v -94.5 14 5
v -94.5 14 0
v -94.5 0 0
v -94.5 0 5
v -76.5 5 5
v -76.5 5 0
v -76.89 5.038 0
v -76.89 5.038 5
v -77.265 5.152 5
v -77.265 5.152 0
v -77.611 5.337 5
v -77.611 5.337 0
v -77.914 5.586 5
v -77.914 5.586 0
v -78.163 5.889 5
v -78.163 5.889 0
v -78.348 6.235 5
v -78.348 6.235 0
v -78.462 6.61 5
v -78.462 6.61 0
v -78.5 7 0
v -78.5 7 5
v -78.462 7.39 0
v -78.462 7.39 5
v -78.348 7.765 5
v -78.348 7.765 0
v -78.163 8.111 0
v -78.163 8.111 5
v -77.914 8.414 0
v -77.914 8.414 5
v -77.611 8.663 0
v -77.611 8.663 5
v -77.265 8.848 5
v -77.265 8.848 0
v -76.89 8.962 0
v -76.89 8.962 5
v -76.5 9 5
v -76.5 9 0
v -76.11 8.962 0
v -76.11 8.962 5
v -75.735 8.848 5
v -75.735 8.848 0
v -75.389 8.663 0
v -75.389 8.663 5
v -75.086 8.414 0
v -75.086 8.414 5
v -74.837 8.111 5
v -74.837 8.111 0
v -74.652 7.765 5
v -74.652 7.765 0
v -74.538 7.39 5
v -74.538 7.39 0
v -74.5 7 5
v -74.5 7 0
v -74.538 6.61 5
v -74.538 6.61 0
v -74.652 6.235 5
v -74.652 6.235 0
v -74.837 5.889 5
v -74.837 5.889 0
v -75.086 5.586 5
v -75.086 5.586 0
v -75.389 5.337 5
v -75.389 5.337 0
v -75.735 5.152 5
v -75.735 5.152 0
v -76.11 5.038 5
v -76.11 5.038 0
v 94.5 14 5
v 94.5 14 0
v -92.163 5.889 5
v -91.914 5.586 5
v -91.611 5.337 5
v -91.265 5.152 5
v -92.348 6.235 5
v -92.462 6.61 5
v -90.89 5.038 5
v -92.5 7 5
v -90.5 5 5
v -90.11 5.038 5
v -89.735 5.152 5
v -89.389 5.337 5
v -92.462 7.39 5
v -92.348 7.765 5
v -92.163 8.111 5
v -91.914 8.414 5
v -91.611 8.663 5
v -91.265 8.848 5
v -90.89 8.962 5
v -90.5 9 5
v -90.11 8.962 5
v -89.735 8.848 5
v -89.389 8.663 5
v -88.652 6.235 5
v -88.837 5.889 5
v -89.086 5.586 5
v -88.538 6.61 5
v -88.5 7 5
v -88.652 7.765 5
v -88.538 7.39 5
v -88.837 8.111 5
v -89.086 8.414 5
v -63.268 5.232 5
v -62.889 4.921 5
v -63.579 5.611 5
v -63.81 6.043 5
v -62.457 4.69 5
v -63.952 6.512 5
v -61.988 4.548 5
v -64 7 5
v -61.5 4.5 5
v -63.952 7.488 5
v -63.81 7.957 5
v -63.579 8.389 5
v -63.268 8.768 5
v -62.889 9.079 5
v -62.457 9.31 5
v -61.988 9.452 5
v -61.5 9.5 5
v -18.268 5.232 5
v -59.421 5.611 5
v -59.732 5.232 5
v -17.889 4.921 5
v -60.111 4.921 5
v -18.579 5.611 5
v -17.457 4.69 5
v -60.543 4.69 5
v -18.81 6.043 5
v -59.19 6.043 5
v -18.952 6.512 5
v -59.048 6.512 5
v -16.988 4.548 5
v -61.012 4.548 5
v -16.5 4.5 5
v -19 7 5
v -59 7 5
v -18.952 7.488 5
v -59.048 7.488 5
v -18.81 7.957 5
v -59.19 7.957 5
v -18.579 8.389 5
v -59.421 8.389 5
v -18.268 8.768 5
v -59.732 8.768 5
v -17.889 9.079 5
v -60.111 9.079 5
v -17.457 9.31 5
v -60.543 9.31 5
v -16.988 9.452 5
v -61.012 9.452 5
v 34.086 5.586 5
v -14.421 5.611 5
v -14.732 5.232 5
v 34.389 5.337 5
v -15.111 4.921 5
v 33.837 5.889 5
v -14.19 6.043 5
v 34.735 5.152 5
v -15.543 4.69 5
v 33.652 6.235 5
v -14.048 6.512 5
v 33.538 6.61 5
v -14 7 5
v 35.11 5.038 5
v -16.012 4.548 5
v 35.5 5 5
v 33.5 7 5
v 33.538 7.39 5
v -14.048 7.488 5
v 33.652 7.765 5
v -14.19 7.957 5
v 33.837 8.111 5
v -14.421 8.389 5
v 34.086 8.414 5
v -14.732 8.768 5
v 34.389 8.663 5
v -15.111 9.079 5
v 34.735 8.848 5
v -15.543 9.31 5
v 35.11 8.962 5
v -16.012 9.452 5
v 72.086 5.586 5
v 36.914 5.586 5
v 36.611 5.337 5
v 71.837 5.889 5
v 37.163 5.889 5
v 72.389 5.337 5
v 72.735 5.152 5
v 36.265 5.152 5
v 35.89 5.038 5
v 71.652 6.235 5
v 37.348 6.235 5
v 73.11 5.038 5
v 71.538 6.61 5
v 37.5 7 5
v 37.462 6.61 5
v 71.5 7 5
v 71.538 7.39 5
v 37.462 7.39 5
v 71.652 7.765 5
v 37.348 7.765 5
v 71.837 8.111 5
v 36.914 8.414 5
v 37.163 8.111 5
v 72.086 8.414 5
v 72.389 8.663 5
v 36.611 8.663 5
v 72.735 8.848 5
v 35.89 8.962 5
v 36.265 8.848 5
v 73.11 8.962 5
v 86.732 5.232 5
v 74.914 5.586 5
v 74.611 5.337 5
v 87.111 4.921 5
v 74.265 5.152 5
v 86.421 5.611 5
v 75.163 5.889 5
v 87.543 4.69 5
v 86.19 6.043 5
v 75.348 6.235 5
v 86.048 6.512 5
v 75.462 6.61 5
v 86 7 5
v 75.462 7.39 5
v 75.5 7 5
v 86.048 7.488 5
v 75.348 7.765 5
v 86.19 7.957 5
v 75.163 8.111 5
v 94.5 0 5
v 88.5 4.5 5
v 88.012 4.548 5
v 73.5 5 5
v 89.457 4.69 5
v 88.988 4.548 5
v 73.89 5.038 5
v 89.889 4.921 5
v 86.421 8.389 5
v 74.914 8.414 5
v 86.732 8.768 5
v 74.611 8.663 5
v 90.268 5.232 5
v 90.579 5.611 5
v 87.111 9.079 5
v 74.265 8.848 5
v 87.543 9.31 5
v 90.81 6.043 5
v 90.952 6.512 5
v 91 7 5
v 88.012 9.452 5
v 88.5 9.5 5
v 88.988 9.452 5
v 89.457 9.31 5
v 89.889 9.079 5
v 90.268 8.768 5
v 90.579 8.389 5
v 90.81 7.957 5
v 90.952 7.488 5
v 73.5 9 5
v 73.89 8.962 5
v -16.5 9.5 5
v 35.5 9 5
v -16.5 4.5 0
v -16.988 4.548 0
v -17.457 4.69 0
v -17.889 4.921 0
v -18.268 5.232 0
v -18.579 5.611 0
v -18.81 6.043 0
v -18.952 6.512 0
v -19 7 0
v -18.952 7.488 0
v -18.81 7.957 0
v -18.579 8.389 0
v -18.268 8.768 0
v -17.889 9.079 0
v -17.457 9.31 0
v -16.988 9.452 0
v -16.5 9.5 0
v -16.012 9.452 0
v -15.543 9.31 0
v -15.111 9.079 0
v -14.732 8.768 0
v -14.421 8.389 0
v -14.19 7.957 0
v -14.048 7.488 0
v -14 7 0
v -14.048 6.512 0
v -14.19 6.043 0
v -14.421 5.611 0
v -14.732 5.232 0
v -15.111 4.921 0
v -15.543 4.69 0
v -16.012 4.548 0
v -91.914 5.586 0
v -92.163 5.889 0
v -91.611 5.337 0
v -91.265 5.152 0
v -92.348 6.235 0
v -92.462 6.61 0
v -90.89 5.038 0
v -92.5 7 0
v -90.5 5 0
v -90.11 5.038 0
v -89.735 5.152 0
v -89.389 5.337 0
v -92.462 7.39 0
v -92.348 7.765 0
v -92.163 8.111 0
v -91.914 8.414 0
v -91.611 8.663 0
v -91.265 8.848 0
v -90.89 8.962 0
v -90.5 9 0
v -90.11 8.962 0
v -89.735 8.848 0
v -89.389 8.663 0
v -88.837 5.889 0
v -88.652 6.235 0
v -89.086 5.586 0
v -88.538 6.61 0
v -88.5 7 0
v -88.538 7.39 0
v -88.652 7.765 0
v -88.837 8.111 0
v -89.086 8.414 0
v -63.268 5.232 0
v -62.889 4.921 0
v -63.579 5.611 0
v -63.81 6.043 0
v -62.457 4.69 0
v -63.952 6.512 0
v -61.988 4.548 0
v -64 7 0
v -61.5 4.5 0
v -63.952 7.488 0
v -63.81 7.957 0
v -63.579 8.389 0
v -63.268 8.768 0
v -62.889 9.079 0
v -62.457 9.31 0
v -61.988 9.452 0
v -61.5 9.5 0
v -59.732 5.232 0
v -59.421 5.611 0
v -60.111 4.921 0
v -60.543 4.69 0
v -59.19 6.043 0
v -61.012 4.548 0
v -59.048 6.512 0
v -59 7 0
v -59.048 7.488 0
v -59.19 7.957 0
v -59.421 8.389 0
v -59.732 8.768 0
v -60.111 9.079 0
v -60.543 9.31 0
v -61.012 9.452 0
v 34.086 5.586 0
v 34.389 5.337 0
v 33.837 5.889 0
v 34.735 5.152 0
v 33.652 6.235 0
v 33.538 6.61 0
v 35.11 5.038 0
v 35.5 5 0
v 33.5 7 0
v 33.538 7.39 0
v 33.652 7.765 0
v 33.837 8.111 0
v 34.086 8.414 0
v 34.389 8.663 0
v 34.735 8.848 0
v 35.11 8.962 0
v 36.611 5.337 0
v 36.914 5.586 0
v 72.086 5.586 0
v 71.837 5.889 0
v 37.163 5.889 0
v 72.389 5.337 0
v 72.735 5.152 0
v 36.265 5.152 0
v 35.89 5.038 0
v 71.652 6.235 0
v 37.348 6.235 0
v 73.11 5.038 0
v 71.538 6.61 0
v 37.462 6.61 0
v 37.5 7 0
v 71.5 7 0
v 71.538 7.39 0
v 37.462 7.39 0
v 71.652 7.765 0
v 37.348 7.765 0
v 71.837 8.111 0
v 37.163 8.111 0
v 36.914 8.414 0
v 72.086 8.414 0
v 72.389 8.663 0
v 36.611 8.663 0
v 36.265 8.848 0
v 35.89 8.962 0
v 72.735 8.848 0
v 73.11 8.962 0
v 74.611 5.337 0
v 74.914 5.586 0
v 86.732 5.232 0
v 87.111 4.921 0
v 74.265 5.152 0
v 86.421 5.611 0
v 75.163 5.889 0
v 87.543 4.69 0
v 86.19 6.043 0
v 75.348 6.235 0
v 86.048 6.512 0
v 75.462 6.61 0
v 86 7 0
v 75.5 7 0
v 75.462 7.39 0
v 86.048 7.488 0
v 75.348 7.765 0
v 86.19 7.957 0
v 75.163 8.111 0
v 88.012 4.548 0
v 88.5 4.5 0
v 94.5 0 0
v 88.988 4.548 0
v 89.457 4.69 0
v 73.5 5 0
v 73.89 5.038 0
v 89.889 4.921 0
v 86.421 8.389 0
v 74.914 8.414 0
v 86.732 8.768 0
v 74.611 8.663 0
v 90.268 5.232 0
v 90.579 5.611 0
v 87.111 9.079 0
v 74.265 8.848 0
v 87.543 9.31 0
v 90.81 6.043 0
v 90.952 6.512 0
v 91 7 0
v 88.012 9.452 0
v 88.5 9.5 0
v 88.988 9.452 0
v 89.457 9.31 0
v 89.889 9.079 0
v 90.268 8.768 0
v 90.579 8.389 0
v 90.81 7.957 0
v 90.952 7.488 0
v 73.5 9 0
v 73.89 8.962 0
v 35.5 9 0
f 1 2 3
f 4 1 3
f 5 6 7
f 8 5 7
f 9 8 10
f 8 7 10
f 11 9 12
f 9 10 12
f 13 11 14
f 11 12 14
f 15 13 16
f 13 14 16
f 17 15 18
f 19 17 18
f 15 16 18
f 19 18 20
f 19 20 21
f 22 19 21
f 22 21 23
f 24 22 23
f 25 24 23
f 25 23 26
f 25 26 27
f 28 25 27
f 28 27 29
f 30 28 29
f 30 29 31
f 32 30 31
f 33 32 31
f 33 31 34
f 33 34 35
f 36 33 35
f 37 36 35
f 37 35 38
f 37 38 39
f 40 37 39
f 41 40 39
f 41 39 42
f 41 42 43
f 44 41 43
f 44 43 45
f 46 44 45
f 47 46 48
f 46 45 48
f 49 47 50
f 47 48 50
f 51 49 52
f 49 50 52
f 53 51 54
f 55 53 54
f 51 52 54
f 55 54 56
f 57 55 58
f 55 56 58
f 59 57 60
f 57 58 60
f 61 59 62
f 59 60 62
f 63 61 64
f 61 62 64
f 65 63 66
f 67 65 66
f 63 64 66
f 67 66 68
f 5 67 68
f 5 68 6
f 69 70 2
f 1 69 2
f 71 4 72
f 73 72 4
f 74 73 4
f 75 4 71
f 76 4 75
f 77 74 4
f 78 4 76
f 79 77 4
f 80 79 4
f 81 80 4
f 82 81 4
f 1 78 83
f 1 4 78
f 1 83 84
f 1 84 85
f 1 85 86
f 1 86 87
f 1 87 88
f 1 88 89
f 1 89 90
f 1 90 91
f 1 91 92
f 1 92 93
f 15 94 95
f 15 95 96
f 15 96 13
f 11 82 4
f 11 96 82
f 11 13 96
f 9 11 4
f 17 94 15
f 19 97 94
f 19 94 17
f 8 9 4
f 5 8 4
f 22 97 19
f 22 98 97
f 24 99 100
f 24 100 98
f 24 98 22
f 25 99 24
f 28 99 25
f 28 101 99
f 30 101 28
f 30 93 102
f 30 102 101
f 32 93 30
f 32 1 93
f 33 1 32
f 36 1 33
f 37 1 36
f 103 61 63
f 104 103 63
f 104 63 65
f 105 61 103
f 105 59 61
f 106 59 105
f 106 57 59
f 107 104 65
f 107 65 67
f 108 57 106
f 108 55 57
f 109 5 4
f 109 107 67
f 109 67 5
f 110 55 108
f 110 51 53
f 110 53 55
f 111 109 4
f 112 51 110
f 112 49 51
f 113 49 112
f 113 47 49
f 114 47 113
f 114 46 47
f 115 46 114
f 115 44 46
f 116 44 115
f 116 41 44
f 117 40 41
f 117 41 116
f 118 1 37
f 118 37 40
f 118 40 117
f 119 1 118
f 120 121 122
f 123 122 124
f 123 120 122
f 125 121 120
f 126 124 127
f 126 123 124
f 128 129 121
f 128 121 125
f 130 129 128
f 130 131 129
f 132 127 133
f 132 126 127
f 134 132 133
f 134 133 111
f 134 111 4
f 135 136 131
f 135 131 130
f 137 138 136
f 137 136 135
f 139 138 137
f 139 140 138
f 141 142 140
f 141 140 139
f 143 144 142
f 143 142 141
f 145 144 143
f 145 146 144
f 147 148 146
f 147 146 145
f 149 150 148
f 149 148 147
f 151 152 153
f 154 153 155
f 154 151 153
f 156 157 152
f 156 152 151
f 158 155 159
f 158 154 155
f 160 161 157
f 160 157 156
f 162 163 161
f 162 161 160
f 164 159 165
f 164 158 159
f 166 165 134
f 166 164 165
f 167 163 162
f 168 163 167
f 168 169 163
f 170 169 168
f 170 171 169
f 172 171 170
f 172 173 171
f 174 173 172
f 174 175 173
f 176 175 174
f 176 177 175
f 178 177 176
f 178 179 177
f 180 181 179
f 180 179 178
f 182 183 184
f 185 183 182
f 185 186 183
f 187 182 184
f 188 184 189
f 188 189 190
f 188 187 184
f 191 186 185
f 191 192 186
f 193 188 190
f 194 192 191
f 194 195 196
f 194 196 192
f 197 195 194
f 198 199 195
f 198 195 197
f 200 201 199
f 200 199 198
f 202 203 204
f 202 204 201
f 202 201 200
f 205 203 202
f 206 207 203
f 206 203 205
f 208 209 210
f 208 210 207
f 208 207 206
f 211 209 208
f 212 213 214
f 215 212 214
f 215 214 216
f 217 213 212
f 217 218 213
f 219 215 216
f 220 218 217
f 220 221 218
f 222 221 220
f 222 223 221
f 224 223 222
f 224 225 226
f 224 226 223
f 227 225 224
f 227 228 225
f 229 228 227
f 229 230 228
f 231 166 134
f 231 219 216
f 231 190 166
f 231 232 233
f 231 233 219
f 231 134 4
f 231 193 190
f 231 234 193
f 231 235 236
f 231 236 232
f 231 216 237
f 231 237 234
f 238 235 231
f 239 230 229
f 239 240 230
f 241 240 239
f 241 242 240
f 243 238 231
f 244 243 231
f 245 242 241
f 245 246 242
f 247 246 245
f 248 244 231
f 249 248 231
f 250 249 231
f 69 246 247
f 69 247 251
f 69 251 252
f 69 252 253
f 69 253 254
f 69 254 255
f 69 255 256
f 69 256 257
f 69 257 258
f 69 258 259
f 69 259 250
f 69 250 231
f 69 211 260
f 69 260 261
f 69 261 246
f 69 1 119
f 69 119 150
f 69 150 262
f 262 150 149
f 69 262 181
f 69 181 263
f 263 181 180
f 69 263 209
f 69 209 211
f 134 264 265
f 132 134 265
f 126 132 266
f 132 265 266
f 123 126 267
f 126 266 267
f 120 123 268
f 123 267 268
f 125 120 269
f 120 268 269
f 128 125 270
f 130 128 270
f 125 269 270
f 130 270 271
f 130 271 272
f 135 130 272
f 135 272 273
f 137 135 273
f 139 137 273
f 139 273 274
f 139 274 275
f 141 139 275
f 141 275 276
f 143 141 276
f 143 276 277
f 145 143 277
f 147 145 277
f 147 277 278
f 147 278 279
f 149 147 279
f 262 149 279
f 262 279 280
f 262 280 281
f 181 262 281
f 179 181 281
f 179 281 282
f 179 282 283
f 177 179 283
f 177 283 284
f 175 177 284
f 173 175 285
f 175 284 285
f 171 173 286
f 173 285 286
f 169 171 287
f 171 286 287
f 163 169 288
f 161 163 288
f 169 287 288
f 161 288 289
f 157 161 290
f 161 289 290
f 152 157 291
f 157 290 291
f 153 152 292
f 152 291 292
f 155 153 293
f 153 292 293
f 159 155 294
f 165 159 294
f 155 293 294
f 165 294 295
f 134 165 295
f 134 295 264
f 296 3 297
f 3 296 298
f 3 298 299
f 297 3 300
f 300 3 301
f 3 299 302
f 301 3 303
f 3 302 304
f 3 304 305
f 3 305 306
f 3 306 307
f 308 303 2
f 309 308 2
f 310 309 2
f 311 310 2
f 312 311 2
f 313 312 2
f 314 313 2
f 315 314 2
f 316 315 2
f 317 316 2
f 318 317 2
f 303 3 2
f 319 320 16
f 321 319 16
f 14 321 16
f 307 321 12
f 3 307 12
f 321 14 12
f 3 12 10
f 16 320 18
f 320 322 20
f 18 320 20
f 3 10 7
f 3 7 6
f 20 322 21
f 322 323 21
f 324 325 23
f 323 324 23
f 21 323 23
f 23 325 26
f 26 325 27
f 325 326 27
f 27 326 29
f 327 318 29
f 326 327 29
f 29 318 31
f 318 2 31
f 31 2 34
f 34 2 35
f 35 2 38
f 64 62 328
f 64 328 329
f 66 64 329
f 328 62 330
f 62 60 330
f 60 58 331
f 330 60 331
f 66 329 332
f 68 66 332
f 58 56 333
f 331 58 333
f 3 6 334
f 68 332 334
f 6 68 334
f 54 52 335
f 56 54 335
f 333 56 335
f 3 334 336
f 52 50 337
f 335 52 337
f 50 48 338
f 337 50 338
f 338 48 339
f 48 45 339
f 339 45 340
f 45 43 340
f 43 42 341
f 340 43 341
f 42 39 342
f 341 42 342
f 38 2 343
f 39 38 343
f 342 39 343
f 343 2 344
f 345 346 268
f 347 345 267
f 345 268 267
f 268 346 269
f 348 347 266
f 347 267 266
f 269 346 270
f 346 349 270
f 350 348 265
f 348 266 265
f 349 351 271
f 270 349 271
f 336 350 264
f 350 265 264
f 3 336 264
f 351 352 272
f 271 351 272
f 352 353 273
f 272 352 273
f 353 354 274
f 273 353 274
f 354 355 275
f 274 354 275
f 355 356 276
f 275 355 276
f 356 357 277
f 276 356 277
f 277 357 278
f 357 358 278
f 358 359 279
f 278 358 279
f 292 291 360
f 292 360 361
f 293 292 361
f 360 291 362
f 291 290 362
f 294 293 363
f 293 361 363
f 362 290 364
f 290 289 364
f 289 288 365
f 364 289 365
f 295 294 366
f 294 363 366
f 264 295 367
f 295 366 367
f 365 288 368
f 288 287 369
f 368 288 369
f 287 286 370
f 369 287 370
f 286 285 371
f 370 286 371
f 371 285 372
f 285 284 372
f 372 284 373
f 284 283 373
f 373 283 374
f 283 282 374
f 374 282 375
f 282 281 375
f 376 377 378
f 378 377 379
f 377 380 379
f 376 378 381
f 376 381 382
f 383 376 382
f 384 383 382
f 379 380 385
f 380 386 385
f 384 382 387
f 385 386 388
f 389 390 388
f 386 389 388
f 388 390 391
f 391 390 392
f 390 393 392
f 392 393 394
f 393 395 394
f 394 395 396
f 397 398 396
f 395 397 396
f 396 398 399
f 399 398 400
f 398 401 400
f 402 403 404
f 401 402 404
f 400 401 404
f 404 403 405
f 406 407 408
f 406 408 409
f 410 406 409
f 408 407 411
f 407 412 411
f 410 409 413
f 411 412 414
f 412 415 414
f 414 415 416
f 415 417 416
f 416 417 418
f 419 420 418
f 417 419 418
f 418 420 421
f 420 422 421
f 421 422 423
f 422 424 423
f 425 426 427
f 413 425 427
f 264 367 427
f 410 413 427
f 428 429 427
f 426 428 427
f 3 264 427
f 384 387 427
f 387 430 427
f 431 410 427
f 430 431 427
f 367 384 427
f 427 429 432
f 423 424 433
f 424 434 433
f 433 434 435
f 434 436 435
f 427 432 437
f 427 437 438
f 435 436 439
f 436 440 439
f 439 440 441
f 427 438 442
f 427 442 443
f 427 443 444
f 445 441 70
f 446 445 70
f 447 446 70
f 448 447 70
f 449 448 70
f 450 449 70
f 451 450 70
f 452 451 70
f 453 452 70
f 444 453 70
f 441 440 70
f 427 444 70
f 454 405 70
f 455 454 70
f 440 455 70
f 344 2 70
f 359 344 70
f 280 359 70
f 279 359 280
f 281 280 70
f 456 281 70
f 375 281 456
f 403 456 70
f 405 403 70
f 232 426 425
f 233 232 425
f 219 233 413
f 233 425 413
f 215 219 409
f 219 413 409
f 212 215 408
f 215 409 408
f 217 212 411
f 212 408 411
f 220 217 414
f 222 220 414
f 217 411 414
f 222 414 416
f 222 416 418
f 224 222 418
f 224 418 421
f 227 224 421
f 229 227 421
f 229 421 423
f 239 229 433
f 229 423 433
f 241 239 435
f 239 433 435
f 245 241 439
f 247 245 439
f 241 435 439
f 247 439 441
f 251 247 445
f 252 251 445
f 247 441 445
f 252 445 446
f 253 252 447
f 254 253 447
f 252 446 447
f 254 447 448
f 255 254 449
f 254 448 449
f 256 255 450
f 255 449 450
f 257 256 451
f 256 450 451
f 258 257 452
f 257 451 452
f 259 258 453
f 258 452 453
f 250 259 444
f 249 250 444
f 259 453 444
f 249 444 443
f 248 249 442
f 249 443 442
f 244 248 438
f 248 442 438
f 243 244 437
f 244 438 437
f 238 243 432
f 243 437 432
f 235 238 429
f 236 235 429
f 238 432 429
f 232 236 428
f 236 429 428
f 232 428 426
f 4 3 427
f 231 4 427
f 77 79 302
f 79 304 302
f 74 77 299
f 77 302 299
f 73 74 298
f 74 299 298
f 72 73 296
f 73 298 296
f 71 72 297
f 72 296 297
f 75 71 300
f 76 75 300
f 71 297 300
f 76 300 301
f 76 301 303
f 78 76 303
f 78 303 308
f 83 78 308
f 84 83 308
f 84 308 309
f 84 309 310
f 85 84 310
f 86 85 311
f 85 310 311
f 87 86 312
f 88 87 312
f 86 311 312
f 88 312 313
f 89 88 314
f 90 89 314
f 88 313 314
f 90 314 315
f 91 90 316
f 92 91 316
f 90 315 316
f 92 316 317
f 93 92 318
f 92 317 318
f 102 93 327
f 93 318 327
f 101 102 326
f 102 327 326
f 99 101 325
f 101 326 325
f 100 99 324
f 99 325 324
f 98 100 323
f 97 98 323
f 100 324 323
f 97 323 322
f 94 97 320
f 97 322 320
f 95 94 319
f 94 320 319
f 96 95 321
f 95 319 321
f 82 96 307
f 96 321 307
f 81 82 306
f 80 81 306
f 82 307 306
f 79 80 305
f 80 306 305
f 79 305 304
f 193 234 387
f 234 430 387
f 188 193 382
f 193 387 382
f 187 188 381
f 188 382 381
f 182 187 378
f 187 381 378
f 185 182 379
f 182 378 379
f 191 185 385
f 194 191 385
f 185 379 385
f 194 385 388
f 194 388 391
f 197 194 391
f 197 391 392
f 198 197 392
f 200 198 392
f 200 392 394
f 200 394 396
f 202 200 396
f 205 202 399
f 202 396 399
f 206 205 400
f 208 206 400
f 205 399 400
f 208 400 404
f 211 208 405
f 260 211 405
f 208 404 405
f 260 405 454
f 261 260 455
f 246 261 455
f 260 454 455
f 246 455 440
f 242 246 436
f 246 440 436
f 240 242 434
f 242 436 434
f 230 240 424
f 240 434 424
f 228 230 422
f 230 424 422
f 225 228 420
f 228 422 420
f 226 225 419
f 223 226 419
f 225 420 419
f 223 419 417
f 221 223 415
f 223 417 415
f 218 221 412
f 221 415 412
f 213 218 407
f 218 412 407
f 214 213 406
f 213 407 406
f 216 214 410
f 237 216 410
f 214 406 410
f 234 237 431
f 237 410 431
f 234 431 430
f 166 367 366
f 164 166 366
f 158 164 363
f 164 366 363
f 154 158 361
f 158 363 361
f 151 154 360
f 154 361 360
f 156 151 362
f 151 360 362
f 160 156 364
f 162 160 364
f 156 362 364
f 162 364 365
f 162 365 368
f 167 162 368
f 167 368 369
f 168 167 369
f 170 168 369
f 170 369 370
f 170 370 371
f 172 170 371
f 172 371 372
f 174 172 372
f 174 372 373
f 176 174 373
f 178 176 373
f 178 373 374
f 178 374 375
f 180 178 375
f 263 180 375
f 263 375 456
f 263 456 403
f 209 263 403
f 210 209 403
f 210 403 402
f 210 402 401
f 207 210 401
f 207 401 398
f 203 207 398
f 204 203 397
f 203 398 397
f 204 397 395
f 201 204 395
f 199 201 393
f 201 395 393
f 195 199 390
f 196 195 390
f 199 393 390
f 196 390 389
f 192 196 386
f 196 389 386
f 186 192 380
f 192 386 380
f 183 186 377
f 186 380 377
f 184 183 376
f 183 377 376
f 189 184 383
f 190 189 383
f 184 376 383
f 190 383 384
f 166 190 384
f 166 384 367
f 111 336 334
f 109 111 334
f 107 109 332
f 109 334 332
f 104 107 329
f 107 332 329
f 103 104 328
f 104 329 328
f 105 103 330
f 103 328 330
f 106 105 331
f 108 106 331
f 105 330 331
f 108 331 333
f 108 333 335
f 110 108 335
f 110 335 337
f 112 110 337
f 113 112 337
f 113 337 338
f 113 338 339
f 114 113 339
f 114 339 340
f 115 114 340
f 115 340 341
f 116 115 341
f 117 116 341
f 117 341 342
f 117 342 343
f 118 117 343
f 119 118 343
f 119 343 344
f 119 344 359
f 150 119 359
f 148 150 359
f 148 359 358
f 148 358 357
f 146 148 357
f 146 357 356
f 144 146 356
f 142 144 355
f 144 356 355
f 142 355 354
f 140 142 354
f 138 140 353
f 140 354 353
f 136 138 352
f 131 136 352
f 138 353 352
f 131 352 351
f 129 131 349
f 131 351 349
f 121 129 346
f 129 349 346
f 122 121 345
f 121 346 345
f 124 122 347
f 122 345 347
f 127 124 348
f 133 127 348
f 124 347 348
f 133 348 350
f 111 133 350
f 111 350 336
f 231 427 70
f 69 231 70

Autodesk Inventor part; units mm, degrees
ref_plane "YZ Plane" through (0, 0, 0) normal (1, 0, 0) x (0, 1, 0)
ref_plane "XZ Plane" through (0, 0, 0) normal (0, 1, 0) x (-1, 0, 0)
ref_plane "XY Plane" through (0, 0, 0) normal (0, 0, 1) x (1, 0, 0)
sketch "Sketch1" plane through (0, 0, 0) normal (0, 0, 1) x (1, 0, 0)
  line L0 (-94.5, 0) -> (94.5, 0)
  line L1 (94.5, 0) -> (94.5, 14)
  line L2 (94.5, 14) -> (-94.5, 14)
  line L3 (-94.5, 14) -> (-94.5, 0)
  point P0 (0, 0)
  point P1 (0, 0)
  dimension "d0" = 14
  dimension "d1" = 189
extrude "Extrusion1" add sketch "Sketch1" along normal blind 5
sketch "Sketch2" plane through (0, 0, 5) normal (0, 0, 1) x (1, 0, 0)
  line L0 (94.5, 0) -> (94.5, 14) projected
  line L1 (-94.5, 0) -> (94.5, 0) projected
  point P0 (0, 0)
  point P1 (-61.5, 7)
  point P2 (-16.5, 7)
  point P3 (88.5, 7)
  dimension "d4" = 6
  dimension "d5" = 7
  dimension "d6" = 105
  dimension "d7" = 45
hole "Hole1" at (-61.5, 7, 5) at (-16.5, 7, 5) at (88.5, 7, 5) direction (0, 0, -1) diameter 5 depth 5
sketch "Sketch3" plane through (0, 0, 5) normal (0, 0, 1) x (1, 0, 0)
  line L0 (-94.5, 0) -> (94.5, 0) projected
  circle A0 centre (88.5, 7) radius 2.5 projected
  circle A1 centre (-61.5, 7) radius 2.5 projected
  point P0 (0, 0)
  point P1 (73.5, 7)
  point P2 (35.5, 7)
  point P3 (-76.5, 7)
  point P4 (-90.5, 7)
  dimension "d22" = 7
  dimension "d23" = 15
  dimension "d24" = 38
  dimension "d25" = 15
  dimension "d26" = 14
hole "Hole2" at (73.5, 7, 5) at (35.5, 7, 5) at (-76.5, 7, 5) at (-90.5, 7, 5) direction (0, 0, -1) diameter 4 depth 5
properties part number "144" material "Stainless Steel"
